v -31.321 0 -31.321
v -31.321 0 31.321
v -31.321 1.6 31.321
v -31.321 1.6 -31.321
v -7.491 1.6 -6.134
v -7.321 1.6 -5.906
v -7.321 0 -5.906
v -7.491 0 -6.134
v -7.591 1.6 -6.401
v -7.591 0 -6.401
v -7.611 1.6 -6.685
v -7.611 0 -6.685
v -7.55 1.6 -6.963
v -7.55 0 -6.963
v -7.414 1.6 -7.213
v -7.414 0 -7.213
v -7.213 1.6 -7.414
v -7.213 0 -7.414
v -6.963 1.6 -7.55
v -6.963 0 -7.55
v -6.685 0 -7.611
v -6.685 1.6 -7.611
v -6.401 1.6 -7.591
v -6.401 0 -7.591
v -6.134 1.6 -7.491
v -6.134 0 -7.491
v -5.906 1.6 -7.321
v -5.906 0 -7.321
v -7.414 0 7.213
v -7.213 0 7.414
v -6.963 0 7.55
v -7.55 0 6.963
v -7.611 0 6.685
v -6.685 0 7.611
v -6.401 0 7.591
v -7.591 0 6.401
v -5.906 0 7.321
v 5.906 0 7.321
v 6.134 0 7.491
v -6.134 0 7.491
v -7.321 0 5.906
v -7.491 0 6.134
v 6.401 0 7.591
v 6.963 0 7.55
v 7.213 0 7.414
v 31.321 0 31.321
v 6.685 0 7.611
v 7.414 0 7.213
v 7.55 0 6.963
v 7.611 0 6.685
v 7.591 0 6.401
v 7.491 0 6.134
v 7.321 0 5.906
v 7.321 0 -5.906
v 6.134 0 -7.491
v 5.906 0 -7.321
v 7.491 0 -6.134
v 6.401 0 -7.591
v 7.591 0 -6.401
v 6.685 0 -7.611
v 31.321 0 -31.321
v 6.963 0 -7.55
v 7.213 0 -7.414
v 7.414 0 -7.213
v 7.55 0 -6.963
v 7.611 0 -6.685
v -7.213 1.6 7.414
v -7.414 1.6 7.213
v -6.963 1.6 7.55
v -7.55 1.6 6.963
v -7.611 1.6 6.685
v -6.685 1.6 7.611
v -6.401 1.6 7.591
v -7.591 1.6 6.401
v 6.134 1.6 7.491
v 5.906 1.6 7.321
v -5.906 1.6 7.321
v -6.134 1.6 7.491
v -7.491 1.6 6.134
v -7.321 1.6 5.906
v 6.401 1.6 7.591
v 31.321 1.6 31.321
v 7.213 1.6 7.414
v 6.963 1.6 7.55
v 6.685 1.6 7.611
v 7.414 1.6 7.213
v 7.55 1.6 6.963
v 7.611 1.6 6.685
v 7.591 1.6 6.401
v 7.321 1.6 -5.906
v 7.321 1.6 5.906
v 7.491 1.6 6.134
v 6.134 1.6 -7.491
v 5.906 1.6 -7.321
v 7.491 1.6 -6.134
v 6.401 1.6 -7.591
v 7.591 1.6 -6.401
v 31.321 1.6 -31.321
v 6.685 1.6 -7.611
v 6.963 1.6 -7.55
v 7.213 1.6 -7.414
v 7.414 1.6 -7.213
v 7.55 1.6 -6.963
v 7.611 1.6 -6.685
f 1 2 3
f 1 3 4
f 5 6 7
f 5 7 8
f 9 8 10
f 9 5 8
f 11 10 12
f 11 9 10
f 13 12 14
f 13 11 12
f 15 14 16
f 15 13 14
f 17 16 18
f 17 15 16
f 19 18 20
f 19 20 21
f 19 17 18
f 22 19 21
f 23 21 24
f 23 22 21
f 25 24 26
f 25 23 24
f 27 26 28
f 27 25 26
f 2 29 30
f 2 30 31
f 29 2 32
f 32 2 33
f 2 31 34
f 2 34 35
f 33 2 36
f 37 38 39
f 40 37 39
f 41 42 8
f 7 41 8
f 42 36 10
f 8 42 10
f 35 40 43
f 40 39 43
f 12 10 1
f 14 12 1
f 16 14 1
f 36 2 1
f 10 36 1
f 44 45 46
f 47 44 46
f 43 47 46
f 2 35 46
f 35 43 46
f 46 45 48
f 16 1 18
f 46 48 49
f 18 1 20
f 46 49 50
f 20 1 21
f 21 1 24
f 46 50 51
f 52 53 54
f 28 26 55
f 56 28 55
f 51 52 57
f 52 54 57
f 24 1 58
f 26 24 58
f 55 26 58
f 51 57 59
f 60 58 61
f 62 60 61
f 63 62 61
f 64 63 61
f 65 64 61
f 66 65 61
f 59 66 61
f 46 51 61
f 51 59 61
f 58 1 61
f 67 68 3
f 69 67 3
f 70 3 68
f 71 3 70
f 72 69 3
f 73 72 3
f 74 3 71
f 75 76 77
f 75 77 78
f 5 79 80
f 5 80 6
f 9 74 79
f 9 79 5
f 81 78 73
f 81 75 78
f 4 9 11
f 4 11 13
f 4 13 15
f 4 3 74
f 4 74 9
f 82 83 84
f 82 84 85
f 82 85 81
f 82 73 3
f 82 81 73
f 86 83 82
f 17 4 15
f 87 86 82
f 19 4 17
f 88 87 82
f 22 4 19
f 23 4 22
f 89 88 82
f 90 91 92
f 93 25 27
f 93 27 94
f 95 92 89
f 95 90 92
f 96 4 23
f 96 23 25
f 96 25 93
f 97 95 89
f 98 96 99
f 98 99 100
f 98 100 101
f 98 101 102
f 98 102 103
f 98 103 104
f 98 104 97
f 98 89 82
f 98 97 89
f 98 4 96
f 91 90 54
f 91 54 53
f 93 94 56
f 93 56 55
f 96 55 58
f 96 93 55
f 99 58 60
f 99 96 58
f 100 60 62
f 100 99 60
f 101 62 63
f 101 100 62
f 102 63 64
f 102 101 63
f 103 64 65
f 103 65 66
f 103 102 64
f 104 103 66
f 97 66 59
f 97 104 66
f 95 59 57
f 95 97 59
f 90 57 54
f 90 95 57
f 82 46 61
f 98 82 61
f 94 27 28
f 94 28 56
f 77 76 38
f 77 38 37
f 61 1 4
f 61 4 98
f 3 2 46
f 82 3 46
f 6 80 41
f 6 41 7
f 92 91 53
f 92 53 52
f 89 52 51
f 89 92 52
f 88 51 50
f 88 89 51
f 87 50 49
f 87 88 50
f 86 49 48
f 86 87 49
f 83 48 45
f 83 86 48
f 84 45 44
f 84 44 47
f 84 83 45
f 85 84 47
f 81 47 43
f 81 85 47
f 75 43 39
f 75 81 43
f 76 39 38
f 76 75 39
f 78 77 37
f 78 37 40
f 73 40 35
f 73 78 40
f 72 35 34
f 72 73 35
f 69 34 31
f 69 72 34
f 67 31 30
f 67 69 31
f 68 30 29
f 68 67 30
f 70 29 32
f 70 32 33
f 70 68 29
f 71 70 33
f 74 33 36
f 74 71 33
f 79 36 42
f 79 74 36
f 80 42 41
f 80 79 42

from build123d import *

# Parameters (mm, degrees)
SKETCH_1_W          = 62.64117319
SKETCH_1_H          = 62.64117319
EXTRUDE_1_DEPTH     = 1.6
CUT_EXTRUDE_1_DEPTH = 1.6


with BuildPart() as part:
    # 草图1 → 凸台-拉伸1 (new body)
    with BuildSketch(Plane(origin=(0, 0, 0), x_dir=(1, 0, 0), z_dir=(0, 1, 0))):
        Rectangle(SKETCH_1_W, SKETCH_1_H)
    extrude(amount=EXTRUDE_1_DEPTH)

    # 草图2 → 切除-拉伸1 (cut)
    with BuildSketch(Plane(origin=(0, 1.6, 0), x_dir=(1, 0, 0), z_dir=(0, 1, 0))):
        with BuildLine():
            Line((-5.906373033, 7.320586595), (5.906373033, 7.320586595))
            ThreePointArc((5.906373033, 7.320586595), (7.320586595, 7.320586595), (7.320586595, 5.906373033))
            Line((7.320586595, 5.906373033), (7.320586595, -5.906373033))
            ThreePointArc((7.320586595, -5.906373033), (7.320586595, -7.320586595), (5.906373033, -7.320586595))
            Line((5.906373033, -7.320586595), (-5.906373033, -7.320586595))
            ThreePointArc((-5.906373033, -7.320586595), (-7.320586595, -7.320586595), (-7.320586595, -5.906373033))
            Line((-7.320586595, -5.906373033), (-7.320586595, 5.906373033))
            ThreePointArc((-7.320586595, 5.906373033), (-7.320586595, 7.320586595), (-5.906373033, 7.320586595))
        make_face()
    extrude(amount=-CUT_EXTRUDE_1_DEPTH, mode=Mode.SUBTRACT)


solid = part.part
